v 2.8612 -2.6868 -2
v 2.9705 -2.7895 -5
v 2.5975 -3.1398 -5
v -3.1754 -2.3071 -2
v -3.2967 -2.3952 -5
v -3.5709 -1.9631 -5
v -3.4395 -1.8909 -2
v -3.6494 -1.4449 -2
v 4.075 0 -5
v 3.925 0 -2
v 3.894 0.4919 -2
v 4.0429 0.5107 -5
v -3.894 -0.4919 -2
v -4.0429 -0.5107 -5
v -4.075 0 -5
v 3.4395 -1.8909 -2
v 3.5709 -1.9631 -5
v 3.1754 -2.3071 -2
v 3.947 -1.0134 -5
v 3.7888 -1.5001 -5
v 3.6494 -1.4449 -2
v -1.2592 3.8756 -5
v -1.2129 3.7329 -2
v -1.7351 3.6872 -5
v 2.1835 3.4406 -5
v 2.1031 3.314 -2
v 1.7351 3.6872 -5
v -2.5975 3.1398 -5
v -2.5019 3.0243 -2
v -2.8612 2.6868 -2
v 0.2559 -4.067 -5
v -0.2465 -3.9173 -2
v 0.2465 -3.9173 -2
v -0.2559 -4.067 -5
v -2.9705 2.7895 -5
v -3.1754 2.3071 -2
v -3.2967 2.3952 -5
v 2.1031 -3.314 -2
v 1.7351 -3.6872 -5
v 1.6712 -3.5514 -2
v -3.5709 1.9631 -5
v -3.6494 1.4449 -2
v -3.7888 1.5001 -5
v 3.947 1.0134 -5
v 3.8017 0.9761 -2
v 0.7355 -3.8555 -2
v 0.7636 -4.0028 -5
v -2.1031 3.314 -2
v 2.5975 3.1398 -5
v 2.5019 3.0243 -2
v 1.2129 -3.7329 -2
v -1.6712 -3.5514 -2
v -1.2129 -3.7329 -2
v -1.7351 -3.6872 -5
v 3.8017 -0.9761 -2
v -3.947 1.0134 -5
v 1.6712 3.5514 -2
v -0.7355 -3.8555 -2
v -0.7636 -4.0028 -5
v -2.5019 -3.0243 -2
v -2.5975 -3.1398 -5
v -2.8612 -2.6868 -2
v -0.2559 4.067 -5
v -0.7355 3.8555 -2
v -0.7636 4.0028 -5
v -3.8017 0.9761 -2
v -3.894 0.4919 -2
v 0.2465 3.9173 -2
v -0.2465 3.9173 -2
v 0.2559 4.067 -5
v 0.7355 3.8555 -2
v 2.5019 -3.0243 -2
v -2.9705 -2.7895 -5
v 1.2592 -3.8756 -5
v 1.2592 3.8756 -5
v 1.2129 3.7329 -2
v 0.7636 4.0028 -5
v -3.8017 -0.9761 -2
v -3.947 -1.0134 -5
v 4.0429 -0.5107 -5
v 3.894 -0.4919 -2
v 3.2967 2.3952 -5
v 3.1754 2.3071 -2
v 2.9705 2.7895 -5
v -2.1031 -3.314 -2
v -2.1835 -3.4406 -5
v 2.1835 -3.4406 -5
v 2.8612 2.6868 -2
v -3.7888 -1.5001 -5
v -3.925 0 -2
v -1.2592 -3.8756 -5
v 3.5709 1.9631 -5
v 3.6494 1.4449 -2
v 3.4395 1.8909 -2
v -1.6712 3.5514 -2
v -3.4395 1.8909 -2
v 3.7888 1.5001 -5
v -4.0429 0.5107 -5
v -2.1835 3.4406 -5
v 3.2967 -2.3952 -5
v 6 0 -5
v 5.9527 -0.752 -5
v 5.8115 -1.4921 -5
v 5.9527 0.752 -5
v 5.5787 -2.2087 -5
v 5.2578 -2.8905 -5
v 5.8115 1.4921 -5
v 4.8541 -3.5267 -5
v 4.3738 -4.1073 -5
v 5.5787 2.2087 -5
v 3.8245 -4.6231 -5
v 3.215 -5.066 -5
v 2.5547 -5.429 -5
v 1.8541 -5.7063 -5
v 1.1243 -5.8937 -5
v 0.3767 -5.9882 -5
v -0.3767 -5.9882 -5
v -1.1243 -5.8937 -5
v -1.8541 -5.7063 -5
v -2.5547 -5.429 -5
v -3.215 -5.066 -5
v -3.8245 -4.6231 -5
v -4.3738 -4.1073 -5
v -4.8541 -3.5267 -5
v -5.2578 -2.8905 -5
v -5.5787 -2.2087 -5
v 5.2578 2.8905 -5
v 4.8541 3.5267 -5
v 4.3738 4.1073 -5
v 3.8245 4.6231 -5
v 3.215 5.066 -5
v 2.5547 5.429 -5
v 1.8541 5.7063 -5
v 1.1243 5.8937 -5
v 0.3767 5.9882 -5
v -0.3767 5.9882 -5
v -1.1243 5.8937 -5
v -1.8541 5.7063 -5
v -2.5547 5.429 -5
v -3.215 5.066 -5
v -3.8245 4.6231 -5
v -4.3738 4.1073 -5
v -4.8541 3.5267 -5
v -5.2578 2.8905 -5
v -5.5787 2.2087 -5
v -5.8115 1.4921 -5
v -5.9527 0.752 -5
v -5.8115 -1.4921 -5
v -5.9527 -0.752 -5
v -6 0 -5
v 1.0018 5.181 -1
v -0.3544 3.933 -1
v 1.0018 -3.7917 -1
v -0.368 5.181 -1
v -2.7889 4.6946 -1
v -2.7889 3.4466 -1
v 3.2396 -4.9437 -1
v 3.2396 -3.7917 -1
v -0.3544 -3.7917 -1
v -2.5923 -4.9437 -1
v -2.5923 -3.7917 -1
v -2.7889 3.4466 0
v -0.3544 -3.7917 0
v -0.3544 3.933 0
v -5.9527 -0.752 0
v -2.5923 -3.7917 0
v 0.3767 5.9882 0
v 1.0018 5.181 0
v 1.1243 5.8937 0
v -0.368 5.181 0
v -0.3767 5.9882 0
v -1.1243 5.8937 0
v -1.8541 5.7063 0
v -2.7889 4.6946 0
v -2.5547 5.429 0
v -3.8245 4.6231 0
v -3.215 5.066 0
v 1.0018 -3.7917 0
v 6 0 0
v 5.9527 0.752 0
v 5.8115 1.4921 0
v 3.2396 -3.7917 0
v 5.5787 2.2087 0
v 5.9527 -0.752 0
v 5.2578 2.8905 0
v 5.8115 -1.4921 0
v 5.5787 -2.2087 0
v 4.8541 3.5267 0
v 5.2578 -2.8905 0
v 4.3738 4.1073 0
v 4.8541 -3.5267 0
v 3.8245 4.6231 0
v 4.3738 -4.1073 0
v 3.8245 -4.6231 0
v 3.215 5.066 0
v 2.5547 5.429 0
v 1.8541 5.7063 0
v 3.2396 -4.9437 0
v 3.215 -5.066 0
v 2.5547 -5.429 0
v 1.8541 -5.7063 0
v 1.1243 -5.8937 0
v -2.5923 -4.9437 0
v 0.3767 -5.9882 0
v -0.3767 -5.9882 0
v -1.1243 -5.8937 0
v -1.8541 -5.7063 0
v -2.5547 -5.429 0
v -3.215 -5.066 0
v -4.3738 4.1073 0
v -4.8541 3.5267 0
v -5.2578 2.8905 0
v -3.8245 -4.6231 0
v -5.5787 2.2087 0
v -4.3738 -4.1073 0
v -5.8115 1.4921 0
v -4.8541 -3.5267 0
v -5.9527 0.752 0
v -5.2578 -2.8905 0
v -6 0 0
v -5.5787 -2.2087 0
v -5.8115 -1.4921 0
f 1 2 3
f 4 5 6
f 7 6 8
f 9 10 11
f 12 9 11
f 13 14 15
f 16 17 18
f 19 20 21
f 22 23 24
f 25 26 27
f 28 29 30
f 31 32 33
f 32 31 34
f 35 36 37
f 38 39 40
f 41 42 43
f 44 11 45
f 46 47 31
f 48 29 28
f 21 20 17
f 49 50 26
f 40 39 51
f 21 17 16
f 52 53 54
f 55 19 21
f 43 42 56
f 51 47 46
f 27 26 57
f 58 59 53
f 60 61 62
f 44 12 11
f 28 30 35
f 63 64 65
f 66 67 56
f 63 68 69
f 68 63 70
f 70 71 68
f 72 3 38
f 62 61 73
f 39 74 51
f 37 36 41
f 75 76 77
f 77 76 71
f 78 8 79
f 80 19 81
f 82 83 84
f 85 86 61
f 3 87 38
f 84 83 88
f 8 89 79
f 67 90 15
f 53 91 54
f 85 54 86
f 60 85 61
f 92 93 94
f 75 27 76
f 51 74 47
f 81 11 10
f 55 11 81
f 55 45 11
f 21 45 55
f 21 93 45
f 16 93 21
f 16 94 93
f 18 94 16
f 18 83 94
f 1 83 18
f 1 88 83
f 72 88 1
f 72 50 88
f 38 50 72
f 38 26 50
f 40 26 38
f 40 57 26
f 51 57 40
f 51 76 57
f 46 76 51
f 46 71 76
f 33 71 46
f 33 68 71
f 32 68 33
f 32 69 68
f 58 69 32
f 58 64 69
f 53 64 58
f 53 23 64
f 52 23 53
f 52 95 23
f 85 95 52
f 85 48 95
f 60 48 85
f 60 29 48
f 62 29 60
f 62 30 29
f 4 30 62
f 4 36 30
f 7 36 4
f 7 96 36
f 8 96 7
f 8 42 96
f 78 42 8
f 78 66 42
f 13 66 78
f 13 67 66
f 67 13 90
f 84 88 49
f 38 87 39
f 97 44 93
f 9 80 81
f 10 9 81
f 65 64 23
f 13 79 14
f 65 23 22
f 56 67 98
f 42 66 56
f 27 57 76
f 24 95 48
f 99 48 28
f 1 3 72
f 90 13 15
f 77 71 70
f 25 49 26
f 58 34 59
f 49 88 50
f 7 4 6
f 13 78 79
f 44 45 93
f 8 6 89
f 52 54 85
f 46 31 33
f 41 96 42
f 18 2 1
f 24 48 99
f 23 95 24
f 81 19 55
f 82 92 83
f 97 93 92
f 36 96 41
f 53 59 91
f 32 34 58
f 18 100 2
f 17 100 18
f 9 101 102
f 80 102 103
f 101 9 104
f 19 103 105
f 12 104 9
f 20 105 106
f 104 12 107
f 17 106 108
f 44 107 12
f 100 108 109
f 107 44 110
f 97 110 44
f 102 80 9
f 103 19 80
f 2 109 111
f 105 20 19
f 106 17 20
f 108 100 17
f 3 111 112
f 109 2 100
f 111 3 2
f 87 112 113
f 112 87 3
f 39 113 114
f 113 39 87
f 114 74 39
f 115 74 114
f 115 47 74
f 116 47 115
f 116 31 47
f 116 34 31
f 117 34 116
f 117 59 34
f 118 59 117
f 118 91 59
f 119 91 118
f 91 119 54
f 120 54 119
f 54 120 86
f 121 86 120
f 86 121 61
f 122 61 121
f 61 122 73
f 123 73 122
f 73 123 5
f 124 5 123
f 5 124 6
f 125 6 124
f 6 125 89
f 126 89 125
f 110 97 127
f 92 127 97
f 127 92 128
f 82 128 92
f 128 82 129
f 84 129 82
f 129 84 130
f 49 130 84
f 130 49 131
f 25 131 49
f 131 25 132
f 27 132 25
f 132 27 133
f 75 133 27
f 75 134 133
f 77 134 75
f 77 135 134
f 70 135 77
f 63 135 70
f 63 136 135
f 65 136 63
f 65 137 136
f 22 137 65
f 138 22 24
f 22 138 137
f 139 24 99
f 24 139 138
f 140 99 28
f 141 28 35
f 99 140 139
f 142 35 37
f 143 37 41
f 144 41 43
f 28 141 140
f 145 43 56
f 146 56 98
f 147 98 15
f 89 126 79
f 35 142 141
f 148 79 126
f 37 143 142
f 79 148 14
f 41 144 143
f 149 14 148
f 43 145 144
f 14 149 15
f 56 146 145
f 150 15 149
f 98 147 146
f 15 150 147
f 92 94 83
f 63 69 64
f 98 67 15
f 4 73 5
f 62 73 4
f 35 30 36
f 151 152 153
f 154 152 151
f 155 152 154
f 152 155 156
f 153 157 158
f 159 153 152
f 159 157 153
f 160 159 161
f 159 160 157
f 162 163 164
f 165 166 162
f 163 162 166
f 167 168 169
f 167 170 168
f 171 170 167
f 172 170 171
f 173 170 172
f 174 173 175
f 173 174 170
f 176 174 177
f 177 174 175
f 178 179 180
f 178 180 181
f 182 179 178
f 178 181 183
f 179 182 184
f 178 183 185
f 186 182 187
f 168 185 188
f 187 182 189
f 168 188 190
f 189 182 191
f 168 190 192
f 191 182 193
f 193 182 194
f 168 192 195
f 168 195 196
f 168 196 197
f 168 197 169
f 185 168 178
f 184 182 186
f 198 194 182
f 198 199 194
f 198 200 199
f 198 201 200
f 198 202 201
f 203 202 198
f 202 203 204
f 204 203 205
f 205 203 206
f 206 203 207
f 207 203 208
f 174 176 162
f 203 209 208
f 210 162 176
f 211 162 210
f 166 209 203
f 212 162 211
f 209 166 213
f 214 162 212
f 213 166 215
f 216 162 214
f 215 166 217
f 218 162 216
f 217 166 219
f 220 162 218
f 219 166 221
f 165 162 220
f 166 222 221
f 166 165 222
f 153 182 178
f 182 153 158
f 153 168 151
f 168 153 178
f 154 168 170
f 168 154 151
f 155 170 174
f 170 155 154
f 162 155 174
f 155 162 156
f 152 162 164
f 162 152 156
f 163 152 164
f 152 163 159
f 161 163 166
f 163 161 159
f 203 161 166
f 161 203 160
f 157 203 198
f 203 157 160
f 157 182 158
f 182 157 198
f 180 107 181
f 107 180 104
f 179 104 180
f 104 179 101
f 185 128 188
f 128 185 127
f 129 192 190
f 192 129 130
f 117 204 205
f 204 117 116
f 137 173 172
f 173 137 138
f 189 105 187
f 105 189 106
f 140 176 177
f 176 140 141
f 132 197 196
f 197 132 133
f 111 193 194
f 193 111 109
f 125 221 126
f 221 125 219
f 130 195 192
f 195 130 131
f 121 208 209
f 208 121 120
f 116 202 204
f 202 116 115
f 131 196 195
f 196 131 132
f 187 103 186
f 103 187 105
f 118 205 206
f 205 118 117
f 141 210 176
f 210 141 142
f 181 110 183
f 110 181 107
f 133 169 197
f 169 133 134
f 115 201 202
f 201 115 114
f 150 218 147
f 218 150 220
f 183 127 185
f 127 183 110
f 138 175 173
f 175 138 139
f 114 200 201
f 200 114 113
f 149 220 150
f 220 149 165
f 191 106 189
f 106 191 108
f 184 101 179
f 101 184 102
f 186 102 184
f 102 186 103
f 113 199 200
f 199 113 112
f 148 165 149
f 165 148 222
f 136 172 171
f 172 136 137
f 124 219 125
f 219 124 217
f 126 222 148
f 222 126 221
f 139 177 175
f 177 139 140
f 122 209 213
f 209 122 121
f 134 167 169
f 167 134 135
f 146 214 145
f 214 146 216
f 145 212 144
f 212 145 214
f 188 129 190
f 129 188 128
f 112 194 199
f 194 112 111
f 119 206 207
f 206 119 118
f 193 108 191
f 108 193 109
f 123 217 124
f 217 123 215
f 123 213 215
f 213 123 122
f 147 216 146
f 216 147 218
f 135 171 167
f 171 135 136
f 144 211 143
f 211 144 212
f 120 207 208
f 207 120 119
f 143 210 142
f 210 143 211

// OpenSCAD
$fn = 50;

difference() {
	union() {
		translate(v = [0, 0, -5.0]) {
			cylinder(h = 5, r = 6.0);
		}
	}
	union() {
		#translate(v = [0, 0, -5.0]) {
			cylinder(h = 3, r1 = 4.075, r2 = 3.925);
		}
		translate(v = [0, 0, -1]) {
			linear_extrude(height = 1) {
				text(font = "Impact", halign = "center", size = 10, text = "1", valign = "center");
			}
		}
	}
}
